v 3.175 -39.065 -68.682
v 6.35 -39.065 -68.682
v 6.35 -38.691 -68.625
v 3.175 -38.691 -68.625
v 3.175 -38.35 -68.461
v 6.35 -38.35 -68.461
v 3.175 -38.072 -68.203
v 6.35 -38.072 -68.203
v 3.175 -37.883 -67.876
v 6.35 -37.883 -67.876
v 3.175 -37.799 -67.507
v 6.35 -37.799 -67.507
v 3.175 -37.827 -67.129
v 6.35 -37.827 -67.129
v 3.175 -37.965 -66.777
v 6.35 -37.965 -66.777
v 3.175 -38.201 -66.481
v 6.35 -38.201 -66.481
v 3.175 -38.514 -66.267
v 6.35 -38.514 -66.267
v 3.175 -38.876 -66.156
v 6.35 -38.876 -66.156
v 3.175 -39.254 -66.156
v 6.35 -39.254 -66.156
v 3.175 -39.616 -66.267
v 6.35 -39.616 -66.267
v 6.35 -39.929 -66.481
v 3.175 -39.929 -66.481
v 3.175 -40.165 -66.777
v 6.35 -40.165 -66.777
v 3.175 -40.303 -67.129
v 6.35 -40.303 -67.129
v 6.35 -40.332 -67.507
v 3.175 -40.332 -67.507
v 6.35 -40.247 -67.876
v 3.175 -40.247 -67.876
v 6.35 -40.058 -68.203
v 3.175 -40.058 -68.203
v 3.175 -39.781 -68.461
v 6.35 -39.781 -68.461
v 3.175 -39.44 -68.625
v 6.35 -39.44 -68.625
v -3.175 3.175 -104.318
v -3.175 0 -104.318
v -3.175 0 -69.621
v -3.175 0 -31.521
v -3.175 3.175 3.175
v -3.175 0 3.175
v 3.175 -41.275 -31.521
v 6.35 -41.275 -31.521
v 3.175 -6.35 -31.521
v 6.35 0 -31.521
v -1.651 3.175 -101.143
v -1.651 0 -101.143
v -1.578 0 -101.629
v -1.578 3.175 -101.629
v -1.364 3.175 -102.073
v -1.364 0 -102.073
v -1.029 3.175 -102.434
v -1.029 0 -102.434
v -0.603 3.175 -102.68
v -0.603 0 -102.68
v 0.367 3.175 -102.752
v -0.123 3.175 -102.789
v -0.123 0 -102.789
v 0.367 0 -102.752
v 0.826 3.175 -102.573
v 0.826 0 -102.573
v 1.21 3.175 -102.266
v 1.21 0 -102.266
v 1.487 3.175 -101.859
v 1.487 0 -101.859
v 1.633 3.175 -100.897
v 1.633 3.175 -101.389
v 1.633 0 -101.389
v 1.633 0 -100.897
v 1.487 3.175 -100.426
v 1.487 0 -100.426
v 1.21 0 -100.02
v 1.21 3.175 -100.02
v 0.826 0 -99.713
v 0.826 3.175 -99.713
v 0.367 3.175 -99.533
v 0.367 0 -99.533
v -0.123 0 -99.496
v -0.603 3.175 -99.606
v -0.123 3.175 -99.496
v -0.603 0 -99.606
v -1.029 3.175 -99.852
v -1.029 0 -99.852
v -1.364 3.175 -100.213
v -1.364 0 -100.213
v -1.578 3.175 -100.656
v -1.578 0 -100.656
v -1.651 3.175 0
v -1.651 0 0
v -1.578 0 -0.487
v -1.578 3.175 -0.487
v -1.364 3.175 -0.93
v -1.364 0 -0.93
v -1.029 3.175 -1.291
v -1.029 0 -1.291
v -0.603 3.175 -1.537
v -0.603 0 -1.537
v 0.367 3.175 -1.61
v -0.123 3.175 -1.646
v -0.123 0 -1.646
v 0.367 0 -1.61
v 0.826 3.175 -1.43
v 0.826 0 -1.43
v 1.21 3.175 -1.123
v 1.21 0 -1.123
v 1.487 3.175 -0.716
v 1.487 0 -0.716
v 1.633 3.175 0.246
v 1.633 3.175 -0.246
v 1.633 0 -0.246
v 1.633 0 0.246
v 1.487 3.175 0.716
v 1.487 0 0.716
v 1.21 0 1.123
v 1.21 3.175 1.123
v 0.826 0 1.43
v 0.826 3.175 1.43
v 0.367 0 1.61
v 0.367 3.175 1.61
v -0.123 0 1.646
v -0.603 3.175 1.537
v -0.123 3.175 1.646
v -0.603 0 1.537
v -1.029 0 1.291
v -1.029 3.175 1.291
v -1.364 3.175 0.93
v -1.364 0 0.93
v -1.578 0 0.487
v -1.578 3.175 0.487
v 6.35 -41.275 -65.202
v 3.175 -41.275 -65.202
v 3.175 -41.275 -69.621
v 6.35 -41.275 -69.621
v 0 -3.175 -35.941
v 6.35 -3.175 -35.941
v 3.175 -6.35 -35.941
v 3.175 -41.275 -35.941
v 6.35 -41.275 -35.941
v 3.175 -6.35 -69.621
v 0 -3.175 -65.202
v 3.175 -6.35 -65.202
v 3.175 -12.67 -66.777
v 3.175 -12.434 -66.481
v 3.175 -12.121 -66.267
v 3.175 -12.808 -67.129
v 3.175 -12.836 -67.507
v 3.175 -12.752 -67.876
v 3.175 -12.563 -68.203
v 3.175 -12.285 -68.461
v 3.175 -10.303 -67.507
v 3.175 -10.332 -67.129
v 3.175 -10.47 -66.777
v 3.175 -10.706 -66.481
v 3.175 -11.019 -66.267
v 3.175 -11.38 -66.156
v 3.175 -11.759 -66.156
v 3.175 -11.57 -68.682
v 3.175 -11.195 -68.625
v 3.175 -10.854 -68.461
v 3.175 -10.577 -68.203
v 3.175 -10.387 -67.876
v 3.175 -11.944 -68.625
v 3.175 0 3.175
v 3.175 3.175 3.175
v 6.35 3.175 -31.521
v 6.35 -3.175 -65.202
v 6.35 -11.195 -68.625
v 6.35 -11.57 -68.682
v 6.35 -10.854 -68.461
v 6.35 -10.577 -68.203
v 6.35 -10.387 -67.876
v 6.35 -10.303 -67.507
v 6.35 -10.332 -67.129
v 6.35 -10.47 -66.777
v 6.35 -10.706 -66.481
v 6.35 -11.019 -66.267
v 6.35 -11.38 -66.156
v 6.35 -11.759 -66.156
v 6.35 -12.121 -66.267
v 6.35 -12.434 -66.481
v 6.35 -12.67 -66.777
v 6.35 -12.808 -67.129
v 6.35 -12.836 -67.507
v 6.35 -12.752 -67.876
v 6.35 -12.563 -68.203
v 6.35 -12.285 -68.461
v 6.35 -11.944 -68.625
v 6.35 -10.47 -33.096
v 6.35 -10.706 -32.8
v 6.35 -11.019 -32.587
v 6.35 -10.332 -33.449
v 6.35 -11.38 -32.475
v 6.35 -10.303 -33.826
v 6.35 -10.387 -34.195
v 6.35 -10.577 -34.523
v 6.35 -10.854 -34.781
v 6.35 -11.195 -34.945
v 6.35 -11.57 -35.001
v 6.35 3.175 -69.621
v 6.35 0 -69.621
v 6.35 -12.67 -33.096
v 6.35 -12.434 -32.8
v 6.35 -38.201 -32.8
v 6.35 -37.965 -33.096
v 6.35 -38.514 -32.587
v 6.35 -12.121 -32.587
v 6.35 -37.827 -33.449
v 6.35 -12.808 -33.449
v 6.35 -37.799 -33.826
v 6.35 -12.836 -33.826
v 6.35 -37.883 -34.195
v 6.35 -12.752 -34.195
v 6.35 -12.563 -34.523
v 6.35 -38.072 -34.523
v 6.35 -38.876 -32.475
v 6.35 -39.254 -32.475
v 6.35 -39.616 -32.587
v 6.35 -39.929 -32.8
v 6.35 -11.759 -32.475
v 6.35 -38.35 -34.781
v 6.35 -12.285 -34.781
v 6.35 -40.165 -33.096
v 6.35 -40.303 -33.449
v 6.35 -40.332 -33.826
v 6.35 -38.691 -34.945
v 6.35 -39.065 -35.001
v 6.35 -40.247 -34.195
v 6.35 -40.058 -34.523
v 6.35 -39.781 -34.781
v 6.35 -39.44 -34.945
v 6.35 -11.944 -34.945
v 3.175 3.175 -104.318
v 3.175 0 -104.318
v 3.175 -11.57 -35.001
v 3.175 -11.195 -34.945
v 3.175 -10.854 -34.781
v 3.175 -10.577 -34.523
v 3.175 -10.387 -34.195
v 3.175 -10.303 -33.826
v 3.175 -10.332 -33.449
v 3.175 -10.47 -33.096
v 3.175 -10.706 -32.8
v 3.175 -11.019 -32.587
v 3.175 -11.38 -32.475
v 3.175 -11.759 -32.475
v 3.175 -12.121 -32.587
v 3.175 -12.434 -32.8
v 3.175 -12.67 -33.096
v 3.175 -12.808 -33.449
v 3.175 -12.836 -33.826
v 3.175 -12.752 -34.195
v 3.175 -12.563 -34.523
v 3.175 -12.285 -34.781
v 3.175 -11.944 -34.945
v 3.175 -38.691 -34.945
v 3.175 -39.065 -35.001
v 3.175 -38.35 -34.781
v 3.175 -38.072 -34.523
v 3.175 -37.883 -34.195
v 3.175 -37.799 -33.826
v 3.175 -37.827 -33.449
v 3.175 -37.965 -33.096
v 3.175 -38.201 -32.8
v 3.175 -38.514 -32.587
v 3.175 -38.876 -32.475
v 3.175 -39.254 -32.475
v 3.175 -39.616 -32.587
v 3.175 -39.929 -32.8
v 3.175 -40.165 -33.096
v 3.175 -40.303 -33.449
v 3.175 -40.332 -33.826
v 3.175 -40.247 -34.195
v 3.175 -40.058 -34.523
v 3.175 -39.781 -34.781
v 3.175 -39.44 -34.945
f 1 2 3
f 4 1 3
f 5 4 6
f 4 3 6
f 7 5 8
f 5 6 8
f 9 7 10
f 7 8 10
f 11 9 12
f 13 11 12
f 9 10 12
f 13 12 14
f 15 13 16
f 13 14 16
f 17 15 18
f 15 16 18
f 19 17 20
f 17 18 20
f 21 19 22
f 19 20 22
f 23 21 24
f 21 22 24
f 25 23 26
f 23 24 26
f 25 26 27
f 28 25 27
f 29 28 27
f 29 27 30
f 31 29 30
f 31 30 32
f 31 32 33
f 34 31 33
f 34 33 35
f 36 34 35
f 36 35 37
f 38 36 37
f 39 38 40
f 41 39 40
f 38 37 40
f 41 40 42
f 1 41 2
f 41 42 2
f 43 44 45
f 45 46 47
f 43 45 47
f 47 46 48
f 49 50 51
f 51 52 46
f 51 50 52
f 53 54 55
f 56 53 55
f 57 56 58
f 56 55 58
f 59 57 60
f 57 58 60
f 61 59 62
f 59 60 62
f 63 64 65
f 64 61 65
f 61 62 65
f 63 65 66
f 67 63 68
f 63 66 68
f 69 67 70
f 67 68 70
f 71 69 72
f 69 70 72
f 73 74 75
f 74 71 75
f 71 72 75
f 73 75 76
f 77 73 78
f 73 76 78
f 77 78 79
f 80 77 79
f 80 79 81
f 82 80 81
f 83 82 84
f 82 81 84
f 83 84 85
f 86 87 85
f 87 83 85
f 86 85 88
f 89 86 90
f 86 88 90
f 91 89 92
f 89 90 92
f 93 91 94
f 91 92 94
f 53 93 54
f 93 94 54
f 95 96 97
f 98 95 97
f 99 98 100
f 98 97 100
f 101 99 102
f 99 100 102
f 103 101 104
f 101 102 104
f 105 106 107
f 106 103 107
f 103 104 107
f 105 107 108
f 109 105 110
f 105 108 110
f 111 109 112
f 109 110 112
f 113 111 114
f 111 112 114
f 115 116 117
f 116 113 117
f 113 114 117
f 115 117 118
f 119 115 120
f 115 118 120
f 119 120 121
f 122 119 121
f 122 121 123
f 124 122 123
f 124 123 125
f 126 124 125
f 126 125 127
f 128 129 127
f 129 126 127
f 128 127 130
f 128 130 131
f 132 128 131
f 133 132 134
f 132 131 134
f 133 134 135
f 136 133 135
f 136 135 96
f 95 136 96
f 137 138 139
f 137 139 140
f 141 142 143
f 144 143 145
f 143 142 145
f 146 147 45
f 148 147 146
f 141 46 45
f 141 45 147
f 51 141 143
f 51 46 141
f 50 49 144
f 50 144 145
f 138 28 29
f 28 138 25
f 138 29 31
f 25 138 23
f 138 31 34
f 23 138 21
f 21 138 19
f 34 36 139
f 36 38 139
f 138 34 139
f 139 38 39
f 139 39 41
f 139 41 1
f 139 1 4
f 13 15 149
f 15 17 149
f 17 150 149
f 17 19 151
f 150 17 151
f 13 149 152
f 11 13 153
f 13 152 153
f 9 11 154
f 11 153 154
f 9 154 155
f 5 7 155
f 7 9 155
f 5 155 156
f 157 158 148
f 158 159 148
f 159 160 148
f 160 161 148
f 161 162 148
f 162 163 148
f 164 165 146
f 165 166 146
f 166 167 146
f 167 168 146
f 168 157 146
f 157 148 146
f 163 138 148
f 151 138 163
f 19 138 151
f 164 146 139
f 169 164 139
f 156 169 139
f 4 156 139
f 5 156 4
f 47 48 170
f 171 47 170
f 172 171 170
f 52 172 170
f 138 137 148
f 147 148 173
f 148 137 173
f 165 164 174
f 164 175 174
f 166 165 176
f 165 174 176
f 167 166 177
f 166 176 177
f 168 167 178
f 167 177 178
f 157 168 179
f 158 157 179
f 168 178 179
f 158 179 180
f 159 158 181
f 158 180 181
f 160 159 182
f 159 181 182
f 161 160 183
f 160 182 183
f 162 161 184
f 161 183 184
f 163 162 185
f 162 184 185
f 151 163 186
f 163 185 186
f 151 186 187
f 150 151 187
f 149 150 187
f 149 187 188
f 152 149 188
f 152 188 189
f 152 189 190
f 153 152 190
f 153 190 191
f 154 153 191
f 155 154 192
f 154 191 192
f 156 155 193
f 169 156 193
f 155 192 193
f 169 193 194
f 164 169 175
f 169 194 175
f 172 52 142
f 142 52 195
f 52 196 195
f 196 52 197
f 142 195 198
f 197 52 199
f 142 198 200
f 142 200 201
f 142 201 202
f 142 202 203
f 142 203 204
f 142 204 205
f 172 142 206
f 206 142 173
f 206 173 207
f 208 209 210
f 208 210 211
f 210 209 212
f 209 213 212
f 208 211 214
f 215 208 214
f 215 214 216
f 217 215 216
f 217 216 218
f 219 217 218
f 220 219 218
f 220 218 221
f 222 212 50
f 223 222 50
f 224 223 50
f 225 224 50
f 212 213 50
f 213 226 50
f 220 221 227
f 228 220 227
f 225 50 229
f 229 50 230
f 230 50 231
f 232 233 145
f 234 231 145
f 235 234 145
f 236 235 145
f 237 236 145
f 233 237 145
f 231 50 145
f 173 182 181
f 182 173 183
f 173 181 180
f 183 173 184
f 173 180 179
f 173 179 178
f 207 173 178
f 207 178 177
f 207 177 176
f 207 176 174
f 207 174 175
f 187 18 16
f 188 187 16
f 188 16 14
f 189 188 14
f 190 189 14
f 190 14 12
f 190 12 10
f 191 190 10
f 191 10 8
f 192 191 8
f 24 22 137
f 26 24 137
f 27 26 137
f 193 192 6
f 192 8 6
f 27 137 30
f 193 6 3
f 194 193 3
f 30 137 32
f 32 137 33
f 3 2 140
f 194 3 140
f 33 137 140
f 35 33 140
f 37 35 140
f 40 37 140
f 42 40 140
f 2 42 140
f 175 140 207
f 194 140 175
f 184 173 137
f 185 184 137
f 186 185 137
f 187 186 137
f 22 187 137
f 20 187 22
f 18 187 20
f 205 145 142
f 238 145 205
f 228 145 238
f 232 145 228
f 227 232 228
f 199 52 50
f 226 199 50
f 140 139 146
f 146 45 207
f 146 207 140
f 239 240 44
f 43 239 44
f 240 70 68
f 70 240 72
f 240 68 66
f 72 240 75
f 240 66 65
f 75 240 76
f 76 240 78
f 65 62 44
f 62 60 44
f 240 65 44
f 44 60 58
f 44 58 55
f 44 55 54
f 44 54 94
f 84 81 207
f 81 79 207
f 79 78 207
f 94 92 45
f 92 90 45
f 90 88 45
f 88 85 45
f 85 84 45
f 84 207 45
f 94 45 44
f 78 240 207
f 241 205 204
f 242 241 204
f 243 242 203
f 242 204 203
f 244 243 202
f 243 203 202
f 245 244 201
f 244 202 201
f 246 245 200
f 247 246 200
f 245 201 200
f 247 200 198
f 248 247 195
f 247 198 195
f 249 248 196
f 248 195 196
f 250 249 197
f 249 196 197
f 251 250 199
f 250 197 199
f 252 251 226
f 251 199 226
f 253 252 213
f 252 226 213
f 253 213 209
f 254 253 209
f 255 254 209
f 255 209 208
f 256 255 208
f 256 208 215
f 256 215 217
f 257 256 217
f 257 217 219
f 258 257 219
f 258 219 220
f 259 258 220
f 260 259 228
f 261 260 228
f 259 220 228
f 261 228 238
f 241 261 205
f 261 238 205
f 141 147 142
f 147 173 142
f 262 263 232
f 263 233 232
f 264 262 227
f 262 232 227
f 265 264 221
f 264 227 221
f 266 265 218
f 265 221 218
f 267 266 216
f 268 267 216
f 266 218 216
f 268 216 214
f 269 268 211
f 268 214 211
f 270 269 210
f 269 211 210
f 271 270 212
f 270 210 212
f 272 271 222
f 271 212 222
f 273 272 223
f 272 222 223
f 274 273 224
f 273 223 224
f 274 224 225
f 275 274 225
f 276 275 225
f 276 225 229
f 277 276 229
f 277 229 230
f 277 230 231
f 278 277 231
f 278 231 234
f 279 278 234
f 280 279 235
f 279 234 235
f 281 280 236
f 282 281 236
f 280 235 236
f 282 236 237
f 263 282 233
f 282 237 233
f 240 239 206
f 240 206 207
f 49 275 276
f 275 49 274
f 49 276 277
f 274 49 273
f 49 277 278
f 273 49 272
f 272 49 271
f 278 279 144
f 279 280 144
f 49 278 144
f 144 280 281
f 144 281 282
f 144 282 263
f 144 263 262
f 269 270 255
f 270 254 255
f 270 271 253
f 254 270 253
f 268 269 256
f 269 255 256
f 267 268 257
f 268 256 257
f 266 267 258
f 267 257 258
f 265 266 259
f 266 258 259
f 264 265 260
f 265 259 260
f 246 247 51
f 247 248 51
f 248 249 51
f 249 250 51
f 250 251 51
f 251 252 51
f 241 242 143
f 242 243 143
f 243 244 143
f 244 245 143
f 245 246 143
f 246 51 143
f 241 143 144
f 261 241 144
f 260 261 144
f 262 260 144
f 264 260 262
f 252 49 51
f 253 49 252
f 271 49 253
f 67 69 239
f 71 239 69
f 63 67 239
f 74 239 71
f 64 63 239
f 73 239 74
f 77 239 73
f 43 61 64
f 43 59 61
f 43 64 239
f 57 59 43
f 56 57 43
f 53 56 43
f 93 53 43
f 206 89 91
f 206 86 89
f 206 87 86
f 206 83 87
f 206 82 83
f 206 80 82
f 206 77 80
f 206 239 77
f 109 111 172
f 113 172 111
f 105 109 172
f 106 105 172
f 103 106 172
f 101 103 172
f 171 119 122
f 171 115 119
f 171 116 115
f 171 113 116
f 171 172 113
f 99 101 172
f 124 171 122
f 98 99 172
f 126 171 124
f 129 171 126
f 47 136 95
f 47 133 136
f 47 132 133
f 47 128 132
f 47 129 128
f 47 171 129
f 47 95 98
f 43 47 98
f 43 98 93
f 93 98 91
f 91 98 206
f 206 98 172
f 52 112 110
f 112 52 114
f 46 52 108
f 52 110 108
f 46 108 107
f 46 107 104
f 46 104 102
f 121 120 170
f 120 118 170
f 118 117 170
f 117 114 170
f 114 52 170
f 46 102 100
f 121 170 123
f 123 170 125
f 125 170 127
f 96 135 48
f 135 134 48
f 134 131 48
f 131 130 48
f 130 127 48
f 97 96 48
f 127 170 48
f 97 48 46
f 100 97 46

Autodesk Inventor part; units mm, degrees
ref_plane "YZ Plane" through (0, 0, 0) normal (1, 0, 0) x (0, 1, 0)
ref_plane "XZ Plane" through (0, 0, 0) normal (0, 1, 0) x (-1, 0, 0)
ref_plane "XY Plane" through (0, 0, 0) normal (0, 0, 1) x (1, 0, 0)
sketch "Sketch1" plane through (0, 0, 0) normal (0, 1, 0) x (-1, 0, 0)
  circle A0 centre (0, 0) radius 1.651
  circle A1 centre (0, -101.1428) radius 1.651
  line L0 (0, 0) -> (0, -101.1428) construction
  line L1 (3.175, 3.175) -> (-6.35, 3.175)
  line L2 (-6.35, 3.175) -> (-6.35, -104.3178)
  line L3 (-6.35, -104.3178) -> (3.175, -104.3178)
  line L4 (3.175, -104.3178) -> (3.175, 3.175)
  dimension "d0" = 3.302
  dimension "d1" = 101.1428
  dimension "d3" = 3.175
  dimension "d4" = 3.175
  dimension "d5" = 3.175
  dimension "d6" = 6.35
extrude "Extrusion1" add sketch "Sketch1" along normal blind 3.175
sketch "Sketch2" plane through (0, 0, 0) normal (0, -1, 0) x (1, 0, 0)
  line L0 (6.35, 3.175) -> (6.35, -104.3178) projected
  line L1 (6.35, -31.5214) -> (3.175, -31.5214)
  line L2 (3.175, -31.5214) -> (3.175, -69.6214)
  line L3 (3.175, -69.6214) -> (6.35, -69.6214)
  line L4 (6.35, -69.6214) -> (6.35, -31.5214)
  line L5 (-3.175, -104.3178) -> (-3.175, 3.175) construction
  line L6 (-3.175, -50.5714) -> (6.35, -50.5714) construction
  point P0 (0, 0)
  dimension "d9" = 38.1
  dimension "d10" = 3.175
extrude "Extrusion2" add sketch "Sketch2" along normal blind 41.275
sketch "Sketch3" plane through (6.35, 0, -104.3178) normal (1, 0, 0) x (0, 0, -1)
  circle A0 centre (-70.5866, -39.0652) radius 1.27
  circle A1 centre (-70.5866, -11.5697) radius 1.27
  circle A2 centre (-36.9062, -11.5697) radius 1.27
  circle A3 centre (-36.9062, -39.0652) radius 1.27
  line L0 (-70.5866, -11.5697) -> (-70.5866, -39.0652) construction
  line L1 (-70.5866, -39.0652) -> (-36.9062, -39.0652) construction
  line L2 (-36.9062, -39.0652) -> (-36.9062, -11.5697) construction
  line L3 (-36.9062, -11.5697) -> (-70.5866, -11.5697) construction
  line L4 (-34.6964, -41.275) -> (-72.7964, -41.275) construction
  line L5 (-53.7464, -41.275) -> (-53.7464, 0) construction
  line L6 (-34.6964, 0) -> (-72.7964, 0) construction
  line L7 (-68.3768, -41.275) -> (-39.116, -41.275)
  line L8 (-39.116, -41.275) -> (-39.116, -3.175)
  line L9 (-39.116, -3.175) -> (-68.3768, -3.175)
  line L10 (-68.3768, -3.175) -> (-68.3768, -41.275)
  line L11 (-72.7964, 0) -> (-72.7964, -41.275) projected
  point P0 (-104.3178, 0)
  dimension "d13" = 2.54
  dimension "d14" = 27.4955
  dimension "d15" = 33.6804
  dimension "d17" = 2.2098
  dimension "d18" = 2.2098
  dimension "d19" = 2.2098
  dimension "d20" = 2.2098
  dimension "d21" = 3.175
extrude "Extrusion3" cut sketch "Sketch3" against normal up to surface (3.175 mm away)
chamfer "Chamfer1" distance 6.35 angle 45 1 edges at (3.175, 0, -50.5714)
chamfer "Chamfer2" distance 3.175 distance2 34.6964 1 edges at (6.35, 1.5875, 3.175) measured on face at (0, 1.0583, 3.175)
chamfer "Chamfer3" distance 34.6964 distance2 3.175 1 edges at (6.35, 1.5875, -104.3178) measured on face at (6.35, 2.1167, -68.4869)
properties part number "grumpy camera mount"
